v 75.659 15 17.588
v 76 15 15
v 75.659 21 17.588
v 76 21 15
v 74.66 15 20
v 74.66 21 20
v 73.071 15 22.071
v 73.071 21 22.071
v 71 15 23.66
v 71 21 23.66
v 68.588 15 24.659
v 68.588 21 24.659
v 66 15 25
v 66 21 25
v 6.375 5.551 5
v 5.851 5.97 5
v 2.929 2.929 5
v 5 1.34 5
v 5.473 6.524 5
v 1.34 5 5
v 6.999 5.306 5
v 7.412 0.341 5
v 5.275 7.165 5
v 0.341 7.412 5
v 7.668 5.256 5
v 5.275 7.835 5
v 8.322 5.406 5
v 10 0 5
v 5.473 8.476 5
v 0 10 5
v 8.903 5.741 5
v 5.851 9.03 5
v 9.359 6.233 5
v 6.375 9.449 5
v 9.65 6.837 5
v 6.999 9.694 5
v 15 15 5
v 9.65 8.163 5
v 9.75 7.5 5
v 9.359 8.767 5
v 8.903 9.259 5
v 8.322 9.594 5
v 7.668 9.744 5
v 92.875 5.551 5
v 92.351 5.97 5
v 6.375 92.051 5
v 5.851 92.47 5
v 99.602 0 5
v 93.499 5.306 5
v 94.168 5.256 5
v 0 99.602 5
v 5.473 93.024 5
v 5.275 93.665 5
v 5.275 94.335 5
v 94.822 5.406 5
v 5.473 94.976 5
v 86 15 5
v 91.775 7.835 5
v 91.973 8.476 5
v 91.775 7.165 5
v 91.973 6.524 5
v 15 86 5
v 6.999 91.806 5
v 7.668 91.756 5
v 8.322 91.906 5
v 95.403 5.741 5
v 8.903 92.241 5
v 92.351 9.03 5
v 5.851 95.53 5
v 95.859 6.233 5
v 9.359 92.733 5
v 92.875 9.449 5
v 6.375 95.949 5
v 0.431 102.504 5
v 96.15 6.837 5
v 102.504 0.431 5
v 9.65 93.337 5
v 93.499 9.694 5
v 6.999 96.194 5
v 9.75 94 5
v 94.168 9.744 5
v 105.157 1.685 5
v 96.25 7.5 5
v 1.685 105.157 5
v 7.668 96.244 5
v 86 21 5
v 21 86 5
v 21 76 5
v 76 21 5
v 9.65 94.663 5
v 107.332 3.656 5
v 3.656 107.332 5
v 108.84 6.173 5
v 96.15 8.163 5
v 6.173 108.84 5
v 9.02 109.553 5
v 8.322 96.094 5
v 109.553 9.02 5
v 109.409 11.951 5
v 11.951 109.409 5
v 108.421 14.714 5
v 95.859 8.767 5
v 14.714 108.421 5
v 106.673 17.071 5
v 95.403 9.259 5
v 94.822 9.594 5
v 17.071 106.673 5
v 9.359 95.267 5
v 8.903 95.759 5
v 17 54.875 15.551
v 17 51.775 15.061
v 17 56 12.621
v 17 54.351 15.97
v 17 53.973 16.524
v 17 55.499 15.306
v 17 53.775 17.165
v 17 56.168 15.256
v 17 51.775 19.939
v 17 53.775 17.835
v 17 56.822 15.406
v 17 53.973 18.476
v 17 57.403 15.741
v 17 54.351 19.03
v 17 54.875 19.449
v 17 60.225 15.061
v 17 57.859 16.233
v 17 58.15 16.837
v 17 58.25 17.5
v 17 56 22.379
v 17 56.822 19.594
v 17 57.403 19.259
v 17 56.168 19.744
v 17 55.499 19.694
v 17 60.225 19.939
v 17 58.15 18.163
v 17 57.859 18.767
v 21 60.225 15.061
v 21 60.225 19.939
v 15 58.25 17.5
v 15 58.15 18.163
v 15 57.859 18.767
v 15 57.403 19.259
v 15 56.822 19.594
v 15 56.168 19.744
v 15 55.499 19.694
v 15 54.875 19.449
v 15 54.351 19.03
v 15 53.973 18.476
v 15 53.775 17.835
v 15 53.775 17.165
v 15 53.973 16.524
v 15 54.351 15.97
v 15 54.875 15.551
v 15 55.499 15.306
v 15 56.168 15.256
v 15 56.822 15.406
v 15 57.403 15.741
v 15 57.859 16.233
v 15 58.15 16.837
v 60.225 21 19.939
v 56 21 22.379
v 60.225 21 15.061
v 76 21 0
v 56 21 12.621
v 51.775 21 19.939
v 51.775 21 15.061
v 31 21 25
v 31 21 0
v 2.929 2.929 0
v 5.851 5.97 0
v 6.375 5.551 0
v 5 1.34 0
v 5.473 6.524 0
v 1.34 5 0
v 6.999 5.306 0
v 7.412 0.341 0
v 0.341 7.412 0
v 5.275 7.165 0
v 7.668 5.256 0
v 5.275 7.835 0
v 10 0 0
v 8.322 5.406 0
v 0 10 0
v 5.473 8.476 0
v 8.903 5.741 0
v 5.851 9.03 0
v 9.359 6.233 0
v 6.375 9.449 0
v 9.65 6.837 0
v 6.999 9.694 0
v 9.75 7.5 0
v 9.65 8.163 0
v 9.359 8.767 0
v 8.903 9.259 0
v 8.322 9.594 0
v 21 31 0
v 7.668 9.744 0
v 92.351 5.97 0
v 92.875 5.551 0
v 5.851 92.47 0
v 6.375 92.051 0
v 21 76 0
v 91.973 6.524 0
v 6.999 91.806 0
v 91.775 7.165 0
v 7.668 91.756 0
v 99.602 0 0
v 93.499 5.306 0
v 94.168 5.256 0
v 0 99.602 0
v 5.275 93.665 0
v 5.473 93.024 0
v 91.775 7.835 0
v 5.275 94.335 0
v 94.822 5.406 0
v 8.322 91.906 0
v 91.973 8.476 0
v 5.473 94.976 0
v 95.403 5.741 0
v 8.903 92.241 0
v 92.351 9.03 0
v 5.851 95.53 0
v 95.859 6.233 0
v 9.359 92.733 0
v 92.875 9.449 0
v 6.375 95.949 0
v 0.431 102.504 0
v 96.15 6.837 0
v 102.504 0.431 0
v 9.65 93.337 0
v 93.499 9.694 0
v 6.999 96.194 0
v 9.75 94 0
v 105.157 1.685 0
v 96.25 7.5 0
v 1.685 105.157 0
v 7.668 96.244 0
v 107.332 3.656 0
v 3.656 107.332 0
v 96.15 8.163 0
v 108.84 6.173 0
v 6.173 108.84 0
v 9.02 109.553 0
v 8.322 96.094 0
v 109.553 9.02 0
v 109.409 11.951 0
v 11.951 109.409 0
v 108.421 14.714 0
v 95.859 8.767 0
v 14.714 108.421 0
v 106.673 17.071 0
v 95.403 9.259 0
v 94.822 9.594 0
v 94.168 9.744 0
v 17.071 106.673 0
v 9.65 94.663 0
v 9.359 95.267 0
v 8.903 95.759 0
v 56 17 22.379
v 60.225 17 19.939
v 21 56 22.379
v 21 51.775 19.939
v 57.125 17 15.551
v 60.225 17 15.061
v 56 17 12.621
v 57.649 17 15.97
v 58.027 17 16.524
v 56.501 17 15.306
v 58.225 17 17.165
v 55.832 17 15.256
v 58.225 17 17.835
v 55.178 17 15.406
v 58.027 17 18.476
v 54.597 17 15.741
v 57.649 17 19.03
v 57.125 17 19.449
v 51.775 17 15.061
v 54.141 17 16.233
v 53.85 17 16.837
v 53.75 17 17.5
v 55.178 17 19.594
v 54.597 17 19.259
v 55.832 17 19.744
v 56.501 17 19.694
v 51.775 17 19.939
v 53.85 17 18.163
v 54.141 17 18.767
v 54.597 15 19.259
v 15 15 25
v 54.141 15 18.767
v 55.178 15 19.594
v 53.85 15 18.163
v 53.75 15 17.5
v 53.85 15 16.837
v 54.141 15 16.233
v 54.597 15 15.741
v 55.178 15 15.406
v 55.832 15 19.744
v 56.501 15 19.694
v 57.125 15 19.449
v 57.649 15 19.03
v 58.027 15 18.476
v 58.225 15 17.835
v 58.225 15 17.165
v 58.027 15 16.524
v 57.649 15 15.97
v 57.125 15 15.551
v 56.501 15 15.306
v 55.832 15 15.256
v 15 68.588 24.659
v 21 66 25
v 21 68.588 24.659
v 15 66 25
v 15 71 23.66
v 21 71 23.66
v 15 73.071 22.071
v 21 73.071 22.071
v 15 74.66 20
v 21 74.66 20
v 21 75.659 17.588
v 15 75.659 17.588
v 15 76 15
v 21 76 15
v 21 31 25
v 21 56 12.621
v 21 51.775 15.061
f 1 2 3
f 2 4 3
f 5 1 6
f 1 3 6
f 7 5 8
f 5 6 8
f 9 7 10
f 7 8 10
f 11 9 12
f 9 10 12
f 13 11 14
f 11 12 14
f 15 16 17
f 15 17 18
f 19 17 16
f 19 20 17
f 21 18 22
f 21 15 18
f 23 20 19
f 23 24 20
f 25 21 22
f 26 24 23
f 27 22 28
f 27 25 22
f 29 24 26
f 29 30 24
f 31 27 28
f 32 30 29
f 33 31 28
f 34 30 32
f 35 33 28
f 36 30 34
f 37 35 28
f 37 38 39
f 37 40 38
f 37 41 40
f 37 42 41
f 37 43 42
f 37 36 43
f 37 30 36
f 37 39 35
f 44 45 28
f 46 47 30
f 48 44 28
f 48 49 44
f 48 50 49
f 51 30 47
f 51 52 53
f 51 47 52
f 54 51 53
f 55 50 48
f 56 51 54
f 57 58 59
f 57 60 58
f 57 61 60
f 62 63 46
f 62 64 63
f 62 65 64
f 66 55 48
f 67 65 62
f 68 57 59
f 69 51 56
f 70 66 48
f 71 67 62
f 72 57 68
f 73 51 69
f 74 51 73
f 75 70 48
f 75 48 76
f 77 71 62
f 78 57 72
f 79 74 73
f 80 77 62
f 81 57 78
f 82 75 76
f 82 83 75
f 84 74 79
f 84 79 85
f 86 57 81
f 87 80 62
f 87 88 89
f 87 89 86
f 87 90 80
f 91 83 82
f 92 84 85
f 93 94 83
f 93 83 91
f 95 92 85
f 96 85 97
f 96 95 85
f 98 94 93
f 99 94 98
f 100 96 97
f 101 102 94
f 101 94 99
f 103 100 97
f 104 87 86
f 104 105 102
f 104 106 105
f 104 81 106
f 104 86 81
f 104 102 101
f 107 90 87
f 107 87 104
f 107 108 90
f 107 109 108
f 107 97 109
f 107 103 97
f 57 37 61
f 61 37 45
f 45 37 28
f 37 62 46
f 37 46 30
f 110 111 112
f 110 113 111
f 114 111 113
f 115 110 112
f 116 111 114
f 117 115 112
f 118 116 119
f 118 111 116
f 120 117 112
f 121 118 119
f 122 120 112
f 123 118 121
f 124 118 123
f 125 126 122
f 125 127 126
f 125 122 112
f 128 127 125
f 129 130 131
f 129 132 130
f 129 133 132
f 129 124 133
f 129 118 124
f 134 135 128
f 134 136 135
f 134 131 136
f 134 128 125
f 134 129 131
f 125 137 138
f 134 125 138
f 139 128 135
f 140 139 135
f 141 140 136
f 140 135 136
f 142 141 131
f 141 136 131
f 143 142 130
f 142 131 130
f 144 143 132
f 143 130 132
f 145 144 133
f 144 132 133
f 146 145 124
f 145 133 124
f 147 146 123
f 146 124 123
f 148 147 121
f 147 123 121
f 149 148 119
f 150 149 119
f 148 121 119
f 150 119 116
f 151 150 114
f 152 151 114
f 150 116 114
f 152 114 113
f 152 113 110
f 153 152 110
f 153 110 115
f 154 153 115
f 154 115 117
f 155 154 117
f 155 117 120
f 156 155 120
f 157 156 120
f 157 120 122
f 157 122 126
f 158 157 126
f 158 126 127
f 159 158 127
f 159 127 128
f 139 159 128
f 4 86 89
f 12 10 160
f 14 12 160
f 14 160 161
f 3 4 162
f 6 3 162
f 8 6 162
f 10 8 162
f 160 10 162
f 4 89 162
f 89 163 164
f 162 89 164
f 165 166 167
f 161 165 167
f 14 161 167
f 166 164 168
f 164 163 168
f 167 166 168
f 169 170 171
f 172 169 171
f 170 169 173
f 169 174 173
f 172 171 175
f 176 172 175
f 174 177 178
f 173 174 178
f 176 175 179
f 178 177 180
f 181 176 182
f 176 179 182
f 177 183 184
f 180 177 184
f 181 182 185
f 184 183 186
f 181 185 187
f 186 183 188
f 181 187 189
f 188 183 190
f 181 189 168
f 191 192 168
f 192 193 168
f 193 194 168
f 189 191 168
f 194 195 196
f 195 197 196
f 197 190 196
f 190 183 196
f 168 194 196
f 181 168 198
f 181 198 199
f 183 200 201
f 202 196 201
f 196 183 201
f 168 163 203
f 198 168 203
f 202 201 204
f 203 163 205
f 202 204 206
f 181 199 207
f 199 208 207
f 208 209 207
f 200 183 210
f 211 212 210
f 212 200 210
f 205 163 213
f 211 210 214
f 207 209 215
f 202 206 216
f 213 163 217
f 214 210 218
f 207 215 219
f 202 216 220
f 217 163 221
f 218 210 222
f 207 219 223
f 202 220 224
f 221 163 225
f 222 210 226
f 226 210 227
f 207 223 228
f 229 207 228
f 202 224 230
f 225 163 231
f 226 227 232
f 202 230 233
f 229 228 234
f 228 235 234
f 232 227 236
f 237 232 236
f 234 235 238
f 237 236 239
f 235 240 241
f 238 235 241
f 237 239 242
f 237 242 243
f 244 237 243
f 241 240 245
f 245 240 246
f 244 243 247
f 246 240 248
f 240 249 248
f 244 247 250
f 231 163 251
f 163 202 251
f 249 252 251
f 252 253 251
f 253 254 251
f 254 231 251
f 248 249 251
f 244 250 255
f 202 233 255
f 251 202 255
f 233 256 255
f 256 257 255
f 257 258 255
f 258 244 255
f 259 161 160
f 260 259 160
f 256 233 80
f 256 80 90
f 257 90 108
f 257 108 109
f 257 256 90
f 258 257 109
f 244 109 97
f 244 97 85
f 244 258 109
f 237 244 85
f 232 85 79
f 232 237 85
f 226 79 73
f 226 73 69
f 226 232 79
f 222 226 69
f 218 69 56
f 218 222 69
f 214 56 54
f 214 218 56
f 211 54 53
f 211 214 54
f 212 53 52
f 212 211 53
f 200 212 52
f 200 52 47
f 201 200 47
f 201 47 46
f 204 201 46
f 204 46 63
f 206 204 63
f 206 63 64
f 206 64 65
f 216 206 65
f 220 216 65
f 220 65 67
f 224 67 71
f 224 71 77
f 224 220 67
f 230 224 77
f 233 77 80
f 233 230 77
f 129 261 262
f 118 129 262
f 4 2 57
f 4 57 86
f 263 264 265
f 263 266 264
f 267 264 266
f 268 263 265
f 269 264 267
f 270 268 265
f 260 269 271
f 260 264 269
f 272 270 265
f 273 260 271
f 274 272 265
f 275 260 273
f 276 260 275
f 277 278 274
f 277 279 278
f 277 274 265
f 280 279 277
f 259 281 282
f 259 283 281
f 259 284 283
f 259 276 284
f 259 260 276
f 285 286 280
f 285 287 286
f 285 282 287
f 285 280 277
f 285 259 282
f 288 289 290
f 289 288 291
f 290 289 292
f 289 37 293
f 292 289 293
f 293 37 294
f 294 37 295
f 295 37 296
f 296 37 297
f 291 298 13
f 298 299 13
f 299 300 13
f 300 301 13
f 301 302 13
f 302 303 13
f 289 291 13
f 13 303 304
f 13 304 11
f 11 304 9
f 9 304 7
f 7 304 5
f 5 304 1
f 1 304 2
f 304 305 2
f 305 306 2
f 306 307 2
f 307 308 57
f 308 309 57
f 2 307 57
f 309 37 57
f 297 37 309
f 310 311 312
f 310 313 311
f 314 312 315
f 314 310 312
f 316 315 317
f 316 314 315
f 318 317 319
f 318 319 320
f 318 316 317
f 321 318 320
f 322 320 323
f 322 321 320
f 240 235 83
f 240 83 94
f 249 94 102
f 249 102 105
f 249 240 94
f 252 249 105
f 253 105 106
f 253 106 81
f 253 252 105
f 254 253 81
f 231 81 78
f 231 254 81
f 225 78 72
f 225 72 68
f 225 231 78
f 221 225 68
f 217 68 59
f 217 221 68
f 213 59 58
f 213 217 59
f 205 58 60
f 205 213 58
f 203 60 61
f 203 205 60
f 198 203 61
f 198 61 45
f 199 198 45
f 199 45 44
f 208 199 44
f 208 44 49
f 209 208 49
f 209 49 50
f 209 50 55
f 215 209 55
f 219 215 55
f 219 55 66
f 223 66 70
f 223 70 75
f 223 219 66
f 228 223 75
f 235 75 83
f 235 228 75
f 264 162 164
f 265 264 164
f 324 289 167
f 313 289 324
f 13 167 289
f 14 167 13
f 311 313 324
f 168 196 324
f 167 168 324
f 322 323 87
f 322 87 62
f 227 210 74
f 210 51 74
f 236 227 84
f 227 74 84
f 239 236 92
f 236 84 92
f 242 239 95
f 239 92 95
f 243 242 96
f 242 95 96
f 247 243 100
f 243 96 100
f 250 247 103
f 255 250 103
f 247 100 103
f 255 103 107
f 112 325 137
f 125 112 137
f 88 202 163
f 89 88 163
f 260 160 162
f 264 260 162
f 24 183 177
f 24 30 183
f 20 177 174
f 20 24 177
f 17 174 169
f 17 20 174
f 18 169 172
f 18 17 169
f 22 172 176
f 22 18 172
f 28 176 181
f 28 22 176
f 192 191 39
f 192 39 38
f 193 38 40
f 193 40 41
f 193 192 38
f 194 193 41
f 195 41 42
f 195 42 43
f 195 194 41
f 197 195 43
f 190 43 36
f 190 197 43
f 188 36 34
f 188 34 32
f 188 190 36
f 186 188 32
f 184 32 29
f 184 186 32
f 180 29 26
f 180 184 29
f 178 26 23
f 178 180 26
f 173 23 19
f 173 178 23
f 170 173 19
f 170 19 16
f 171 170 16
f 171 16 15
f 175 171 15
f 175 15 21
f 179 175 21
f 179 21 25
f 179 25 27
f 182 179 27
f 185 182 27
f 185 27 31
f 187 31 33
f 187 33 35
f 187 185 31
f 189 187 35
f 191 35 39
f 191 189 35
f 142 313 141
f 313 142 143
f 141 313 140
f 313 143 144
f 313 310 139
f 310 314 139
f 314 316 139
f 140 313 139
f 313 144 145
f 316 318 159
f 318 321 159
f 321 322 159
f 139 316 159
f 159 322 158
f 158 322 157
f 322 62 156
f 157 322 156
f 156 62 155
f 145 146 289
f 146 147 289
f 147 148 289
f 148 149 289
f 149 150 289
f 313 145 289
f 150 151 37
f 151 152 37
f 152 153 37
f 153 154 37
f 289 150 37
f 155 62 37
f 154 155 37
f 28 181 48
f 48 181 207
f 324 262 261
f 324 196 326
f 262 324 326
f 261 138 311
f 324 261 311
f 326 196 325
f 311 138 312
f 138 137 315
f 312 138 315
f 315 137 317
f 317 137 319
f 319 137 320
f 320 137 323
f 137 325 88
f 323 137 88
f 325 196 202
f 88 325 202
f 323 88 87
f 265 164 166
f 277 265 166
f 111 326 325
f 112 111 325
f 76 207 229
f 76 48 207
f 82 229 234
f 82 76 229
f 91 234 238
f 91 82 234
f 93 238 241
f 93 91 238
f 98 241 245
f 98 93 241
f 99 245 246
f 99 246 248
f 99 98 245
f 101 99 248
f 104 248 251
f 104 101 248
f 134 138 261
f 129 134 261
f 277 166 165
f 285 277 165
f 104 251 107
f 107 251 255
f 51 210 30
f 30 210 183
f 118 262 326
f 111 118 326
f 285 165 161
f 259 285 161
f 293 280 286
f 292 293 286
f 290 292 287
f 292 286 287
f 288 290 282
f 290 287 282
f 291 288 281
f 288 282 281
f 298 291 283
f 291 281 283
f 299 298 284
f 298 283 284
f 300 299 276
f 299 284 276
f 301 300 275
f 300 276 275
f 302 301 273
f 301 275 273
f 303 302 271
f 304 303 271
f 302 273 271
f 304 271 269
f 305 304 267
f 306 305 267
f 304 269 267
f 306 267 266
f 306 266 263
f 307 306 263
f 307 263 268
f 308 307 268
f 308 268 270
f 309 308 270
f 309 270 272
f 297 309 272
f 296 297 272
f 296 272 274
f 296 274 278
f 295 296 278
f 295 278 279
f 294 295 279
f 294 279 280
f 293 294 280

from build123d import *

# Parameters (mm, degrees)
F0_R      = 2.25
F1_DEPTH  = 5
F3_DEPTH  = 20
F4_R      = 10
F5_R      = 2.25
F6_DEPTH  = 25
F7_R      = 2.25
F8_DEPTH  = 25
F9_SIZE   = 9.99999
F11_DEPTH = 4
F13_DEPTH = 4


# Not quite as in the source:
# - a fillet or chamfer is up to 0.001 mm smaller than in the source, because OpenCascade refuses the exact size


with BuildPart() as f1:
    # F0 (on Top) → F1 (new body)
    with BuildSketch(Plane.XY):
        Polygon((123.7436867076, 0), (0, 123.7436867076), (0, 103.7436867076), (0, 0), (103.7436867076, 0), align=None)
        with Locations((7.5, 7.5)):
            Circle(F0_R, mode=Mode.SUBTRACT)
        Polygon((21, 21), (21, 76), (76, 21), align=None, mode=Mode.SUBTRACT)
        with Locations((94, 7.5)):
            Circle(F0_R, mode=Mode.SUBTRACT)
        with Locations((7.5, 94)):
            Circle(F0_R, mode=Mode.SUBTRACT)
    extrude(amount=F1_DEPTH)

    # F2 (on face) → F3 (join)
    with BuildSketch(Plane.XY.offset(5)):
        Polygon((76, 15), (76, 21), (21, 21), (21, 76), (15, 76), (15, 15), align=None)
    extrude(amount=F3_DEPTH)

    # F4
    f4_edges = [f1.edges().sort_by_distance(p)[0] for p in [
        (0, 123.743687, 2.5),
        (123.743687, 0, 2.5),
        (76, 18, 25),
        (18, 76, 25),
        (0, 0, 2.5),
    ]]
    fillet(f4_edges, radius=F4_R)

    # F5 (on face) → F6 (cut)
    with BuildSketch(Plane.YZ.offset(21)):
        with Locations((56, 17.5)):
            Circle(F5_R)
    extrude(amount=-F6_DEPTH, mode=Mode.SUBTRACT)

    # F7 (on face) → F8 (cut)
    with BuildSketch(Plane(origin=(0, 21, 0), x_dir=(-1, 0, 0), z_dir=(0, 1, 0))):
        with Locations((-56, 17.5)):
            Circle(F7_R)
    extrude(amount=-F8_DEPTH, mode=Mode.SUBTRACT)

    # F9 (size 10 in the source; OpenCascade refuses exactly that, so slightly less here)
    f9_edges = [f1.edges().sort_by_distance(p)[0] for p in [
        (18, 76, 5),
        (76, 18, 5),
        (21, 21, 12.5),
    ]]
    chamfer(f9_edges, length=F9_SIZE)

    # F10 (on face) → F11 (cut)
    with BuildSketch(Plane(origin=(0, 21, 0), x_dir=(-1, 0, 0), z_dir=(0, 1, 0))):
        Polygon((-51.775, 15.0606951127), (-51.775, 19.9393048873), (-56, 22.3786097747), (-60.225, 19.9393048873), (-60.225, 15.0606951127), (-56, 12.6213902253), align=None)
    extrude(amount=-F11_DEPTH, mode=Mode.SUBTRACT)

    # F12 (on face) → F13 (cut)
    with BuildSketch(Plane.YZ.offset(21)):
        Polygon((60.225, 15.0606951127), (60.225, 19.9393048873), (56, 22.3786097747), (51.775, 19.9393048873), (51.775, 15.0606951127), (56, 12.6213902253), align=None)
    extrude(amount=-F13_DEPTH, mode=Mode.SUBTRACT)


solid = f1.part
